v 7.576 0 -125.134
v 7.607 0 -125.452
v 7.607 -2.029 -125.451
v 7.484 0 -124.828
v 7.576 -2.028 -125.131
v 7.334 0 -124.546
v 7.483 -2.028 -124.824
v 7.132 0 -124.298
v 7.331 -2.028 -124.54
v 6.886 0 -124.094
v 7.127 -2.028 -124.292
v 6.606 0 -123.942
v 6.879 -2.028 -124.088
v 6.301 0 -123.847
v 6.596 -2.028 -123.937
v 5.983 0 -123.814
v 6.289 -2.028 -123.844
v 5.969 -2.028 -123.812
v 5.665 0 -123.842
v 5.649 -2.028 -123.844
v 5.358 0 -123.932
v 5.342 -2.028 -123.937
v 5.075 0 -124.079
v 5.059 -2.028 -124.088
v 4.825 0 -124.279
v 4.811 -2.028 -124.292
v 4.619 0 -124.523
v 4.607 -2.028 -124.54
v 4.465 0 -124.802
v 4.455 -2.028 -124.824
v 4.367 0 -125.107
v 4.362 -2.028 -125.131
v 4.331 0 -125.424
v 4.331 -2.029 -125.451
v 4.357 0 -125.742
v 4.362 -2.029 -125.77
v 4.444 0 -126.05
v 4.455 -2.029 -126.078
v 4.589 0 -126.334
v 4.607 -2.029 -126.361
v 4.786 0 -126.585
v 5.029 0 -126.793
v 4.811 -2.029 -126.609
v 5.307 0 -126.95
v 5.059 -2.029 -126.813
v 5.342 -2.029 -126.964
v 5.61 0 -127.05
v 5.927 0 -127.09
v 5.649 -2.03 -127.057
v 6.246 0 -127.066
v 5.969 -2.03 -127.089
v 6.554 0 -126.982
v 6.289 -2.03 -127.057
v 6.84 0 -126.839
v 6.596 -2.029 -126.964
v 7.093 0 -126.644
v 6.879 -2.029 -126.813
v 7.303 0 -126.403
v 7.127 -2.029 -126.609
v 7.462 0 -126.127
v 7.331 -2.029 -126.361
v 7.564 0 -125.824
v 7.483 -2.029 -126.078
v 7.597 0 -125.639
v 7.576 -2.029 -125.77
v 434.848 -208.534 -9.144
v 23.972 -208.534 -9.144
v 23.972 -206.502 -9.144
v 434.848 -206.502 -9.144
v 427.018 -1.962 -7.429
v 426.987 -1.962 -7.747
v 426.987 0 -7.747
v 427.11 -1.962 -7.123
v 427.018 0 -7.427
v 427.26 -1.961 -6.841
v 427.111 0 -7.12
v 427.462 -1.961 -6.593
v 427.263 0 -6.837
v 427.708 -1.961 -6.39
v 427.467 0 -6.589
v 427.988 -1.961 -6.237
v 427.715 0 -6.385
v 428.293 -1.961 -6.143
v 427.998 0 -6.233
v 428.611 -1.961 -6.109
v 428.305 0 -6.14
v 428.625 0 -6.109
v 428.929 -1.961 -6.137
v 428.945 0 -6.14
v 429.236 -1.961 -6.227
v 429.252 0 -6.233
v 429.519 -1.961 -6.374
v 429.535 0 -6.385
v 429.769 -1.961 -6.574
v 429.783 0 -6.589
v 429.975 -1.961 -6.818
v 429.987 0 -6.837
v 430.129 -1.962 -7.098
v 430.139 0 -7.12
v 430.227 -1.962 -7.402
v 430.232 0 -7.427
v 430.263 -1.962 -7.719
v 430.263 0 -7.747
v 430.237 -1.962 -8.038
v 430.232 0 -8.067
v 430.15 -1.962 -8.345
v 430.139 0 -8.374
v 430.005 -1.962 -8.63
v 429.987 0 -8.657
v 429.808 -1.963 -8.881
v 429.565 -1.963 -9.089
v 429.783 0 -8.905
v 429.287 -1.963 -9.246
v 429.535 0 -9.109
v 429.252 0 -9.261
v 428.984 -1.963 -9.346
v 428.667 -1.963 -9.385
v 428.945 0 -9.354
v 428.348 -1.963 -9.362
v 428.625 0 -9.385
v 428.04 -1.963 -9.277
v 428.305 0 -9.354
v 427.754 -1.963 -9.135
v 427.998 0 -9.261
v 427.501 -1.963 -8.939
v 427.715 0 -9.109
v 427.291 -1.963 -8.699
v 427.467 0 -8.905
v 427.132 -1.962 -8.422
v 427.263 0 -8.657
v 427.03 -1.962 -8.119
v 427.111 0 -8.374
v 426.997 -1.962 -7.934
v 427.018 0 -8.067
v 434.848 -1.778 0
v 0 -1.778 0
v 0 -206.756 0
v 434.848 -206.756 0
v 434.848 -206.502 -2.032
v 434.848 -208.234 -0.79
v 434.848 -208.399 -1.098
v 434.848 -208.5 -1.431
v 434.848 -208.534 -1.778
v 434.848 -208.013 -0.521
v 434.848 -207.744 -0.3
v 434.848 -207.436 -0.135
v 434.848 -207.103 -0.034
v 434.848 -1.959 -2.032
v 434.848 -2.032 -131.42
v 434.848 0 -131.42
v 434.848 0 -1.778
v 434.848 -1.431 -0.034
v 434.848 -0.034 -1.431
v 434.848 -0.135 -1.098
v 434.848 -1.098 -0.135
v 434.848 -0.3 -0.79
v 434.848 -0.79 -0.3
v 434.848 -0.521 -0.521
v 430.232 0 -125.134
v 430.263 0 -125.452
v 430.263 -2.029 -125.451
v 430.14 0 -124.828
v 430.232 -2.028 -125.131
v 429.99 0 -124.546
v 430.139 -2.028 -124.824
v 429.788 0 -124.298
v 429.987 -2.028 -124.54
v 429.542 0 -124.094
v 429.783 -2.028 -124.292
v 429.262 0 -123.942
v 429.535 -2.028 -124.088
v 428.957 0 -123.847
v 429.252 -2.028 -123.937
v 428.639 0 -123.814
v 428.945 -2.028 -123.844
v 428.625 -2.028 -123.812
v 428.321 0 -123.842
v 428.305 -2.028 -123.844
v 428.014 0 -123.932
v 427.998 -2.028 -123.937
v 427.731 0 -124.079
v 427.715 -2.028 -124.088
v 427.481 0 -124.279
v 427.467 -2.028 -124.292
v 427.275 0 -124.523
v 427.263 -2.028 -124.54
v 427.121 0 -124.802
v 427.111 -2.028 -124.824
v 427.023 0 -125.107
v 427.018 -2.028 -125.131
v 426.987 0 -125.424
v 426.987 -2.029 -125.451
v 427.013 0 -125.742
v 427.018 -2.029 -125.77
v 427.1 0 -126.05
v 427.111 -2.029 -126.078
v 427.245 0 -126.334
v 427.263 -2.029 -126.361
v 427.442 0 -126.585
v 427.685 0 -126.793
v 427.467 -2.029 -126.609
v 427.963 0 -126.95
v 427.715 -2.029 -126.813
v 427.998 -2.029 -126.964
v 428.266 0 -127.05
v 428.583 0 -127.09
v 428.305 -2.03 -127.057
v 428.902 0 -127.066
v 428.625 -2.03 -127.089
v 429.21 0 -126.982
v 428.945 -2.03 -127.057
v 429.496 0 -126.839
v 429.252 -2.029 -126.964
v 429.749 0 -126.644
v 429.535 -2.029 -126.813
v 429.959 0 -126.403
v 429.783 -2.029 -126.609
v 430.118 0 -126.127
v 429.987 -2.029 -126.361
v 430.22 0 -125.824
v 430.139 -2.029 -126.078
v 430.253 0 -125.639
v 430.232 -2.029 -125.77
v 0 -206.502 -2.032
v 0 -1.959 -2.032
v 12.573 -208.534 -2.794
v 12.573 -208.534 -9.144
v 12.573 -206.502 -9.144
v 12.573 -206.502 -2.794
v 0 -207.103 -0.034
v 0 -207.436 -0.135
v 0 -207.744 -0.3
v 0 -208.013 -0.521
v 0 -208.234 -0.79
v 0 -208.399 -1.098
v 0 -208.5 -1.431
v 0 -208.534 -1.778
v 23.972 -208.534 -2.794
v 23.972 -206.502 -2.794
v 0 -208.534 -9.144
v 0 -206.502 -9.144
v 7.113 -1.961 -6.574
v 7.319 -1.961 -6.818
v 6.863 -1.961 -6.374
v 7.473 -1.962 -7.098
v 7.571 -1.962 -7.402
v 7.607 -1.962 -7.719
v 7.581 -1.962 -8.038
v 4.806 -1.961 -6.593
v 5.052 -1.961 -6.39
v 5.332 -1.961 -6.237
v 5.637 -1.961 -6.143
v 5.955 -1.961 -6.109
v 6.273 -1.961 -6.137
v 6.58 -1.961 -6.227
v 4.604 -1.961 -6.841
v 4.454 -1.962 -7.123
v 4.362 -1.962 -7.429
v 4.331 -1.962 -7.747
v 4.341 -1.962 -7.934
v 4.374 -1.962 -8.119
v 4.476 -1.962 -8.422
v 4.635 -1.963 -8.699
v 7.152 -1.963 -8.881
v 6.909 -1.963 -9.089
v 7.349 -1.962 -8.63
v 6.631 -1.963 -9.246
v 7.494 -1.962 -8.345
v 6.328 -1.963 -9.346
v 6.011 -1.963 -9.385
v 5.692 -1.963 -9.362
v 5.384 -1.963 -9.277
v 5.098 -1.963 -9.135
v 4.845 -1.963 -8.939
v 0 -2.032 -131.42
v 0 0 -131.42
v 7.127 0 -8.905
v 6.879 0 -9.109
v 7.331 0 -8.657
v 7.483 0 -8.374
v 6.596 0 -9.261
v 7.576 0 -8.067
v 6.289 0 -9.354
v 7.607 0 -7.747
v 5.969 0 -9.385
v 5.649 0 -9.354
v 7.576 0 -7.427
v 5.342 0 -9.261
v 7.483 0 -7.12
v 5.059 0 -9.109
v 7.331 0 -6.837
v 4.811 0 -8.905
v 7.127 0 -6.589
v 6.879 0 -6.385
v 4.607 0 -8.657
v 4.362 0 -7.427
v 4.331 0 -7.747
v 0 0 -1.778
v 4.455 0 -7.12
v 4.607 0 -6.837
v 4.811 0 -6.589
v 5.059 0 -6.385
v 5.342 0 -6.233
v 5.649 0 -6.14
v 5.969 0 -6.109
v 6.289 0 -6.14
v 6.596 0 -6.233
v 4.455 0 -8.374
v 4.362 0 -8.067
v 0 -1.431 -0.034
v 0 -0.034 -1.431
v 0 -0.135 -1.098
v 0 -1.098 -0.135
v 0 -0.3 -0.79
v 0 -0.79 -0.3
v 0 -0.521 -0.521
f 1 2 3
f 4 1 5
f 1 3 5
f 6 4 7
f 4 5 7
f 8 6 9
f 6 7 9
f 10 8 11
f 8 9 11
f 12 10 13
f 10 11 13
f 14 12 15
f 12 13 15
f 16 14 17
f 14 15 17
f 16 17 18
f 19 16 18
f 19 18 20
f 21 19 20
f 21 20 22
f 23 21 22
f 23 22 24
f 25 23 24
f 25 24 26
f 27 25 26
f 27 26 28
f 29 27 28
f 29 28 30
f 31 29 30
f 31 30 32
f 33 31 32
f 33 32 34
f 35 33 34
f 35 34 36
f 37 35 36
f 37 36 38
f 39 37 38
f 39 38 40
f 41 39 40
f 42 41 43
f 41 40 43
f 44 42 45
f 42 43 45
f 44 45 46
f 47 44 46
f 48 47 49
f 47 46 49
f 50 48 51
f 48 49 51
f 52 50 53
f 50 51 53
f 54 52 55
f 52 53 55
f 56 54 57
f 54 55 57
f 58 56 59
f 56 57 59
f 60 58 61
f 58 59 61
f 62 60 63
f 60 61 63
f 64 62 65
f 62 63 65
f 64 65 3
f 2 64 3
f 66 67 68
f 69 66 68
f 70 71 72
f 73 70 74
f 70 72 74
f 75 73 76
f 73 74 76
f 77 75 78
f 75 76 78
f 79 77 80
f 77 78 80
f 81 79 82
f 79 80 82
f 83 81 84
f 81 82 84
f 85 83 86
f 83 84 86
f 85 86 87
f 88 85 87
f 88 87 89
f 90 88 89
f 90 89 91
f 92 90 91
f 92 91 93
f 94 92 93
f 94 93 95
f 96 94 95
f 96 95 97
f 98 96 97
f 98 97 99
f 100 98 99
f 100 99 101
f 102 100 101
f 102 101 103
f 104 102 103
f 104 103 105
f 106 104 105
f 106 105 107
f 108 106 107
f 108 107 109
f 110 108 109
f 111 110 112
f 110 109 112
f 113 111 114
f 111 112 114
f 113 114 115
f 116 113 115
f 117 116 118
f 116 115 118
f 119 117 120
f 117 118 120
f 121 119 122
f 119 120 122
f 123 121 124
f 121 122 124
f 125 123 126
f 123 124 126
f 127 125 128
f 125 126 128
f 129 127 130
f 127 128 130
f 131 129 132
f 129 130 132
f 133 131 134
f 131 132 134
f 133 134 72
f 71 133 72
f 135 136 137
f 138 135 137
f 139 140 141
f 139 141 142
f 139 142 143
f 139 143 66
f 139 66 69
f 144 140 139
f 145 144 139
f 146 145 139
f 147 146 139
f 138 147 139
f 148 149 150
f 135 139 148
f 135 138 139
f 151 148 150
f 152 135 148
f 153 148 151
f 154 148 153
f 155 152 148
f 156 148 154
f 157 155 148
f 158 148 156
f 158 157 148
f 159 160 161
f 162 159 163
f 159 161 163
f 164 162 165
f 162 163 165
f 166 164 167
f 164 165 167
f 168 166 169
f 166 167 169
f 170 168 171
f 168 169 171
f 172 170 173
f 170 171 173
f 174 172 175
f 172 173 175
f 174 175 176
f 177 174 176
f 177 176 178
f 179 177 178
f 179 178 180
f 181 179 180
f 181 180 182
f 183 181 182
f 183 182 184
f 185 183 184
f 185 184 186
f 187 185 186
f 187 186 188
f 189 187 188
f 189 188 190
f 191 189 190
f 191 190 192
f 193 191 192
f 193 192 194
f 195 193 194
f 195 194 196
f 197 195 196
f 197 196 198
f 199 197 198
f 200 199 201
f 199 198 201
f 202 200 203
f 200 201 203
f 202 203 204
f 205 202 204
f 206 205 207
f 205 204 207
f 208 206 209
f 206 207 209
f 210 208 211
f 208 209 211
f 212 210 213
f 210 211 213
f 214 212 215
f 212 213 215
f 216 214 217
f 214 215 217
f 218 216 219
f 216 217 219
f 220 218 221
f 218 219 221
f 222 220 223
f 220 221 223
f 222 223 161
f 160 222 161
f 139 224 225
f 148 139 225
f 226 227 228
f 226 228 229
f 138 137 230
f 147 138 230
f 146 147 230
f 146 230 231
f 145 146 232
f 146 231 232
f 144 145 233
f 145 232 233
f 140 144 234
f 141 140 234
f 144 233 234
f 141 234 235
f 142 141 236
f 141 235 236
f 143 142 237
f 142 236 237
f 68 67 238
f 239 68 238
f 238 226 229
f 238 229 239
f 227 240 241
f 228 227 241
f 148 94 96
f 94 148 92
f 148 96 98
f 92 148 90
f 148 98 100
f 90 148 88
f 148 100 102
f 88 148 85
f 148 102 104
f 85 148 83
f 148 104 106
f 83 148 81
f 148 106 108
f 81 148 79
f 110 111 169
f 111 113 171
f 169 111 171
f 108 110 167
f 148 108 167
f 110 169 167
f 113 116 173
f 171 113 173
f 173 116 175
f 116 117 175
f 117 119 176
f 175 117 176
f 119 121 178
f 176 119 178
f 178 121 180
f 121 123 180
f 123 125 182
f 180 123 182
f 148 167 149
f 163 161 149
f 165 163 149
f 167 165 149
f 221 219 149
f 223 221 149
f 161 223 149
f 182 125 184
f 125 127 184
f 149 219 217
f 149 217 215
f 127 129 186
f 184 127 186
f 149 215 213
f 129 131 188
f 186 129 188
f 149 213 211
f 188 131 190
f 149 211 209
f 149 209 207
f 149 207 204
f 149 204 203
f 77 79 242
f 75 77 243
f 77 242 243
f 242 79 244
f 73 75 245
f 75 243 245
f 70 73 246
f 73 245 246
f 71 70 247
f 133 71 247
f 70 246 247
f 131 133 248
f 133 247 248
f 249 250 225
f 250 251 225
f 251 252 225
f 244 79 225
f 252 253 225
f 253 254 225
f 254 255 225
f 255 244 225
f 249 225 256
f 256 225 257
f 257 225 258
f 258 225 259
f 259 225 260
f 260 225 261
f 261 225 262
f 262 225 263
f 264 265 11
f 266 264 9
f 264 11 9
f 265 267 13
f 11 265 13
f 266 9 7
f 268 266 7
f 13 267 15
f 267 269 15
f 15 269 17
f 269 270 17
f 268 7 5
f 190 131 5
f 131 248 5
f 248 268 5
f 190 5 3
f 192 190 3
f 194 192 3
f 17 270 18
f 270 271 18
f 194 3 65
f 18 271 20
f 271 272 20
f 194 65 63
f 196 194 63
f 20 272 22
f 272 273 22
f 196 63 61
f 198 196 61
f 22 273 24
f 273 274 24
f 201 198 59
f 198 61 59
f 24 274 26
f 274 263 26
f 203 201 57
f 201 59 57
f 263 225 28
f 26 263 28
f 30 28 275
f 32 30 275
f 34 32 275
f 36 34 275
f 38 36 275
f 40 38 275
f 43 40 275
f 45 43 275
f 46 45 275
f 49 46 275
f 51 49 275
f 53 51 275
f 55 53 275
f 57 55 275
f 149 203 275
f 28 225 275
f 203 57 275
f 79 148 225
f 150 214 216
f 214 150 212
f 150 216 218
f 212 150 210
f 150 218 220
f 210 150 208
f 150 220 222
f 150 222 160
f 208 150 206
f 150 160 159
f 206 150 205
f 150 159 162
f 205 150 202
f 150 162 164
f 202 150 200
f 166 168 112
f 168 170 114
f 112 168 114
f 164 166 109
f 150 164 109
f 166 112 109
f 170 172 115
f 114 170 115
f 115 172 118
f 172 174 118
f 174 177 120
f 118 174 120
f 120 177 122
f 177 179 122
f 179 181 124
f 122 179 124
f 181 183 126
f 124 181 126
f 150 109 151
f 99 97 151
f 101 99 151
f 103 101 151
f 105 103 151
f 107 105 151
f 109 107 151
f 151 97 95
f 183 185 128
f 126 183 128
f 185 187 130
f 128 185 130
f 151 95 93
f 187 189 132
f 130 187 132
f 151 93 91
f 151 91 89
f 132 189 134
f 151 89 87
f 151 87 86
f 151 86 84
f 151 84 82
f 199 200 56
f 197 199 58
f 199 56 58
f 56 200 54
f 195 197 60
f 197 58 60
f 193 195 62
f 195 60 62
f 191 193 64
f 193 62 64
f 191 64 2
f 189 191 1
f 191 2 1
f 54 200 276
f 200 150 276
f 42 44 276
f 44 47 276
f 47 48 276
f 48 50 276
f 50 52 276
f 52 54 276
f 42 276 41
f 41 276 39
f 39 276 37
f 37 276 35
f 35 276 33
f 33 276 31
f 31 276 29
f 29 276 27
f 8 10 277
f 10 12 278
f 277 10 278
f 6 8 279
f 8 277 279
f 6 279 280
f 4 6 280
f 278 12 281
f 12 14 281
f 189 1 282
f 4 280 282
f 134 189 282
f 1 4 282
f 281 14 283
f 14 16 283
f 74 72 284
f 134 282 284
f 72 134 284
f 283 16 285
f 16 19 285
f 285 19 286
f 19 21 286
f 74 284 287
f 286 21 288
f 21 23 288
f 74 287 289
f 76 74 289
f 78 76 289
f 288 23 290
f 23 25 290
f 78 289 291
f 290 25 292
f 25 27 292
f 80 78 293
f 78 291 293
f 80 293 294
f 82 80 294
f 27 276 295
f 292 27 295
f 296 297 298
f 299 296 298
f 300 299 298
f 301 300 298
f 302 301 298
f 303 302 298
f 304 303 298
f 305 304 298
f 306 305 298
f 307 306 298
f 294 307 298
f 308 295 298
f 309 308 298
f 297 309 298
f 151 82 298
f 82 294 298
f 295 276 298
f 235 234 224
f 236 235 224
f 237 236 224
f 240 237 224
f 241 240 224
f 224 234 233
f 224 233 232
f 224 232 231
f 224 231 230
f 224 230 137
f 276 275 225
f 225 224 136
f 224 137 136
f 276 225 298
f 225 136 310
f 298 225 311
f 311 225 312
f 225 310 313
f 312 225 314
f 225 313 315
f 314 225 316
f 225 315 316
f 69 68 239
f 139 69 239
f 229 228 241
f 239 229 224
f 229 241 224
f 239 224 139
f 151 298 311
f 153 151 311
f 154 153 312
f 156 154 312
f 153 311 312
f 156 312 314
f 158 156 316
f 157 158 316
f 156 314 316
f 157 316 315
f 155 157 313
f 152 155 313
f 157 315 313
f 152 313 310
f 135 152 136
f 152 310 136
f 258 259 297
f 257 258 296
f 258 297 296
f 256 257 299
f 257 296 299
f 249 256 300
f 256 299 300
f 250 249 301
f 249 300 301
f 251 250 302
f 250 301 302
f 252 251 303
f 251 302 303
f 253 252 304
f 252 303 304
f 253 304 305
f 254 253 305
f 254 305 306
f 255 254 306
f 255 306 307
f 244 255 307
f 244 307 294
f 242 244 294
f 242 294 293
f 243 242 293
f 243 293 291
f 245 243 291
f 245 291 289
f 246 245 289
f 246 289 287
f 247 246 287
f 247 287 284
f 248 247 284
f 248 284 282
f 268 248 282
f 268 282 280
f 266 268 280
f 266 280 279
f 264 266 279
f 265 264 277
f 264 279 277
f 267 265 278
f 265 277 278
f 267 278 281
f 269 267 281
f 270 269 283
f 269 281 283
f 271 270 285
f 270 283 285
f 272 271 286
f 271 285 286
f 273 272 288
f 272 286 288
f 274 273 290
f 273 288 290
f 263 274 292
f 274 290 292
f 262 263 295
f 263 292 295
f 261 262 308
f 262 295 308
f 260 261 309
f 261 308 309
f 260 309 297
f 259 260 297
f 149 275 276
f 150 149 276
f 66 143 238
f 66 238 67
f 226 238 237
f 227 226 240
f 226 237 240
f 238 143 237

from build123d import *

# Parameters (mm, degrees)
F1_DEPTH = 434.848
F2_W     = 11.3987904478
F2_H     = 6.35
F3_DEPTH = 25.4
F4_R     = 1.6383
F5_DEPTH = 25.4
F6_R     = 1.6383
F7_DEPTH = 25.4


with BuildPart() as f1:
    # F0 (on Right) → F1 (new body)
    with BuildSketch(Plane.YZ):
        with BuildLine():
            ThreePointArc((0, -1.778), (-0.5207641431, -0.5207641431), (-1.778, 0))
            Line((-1.778, 0), (-206.756, 0))
            ThreePointArc((-206.756, 0), (-208.0132358569, -0.5207641431), (-208.534, -1.778))
            Line((-208.534, -1.778), (-208.534, -9.144))
            Line((-208.534, -9.144), (-206.502, -9.144))
            Line((-206.502, -9.144), (-206.502, -2.032))
            Line((-206.502, -2.032), (-1.9587501884, -2.032))
            Line((-1.9587501884, -2.032), (-2.032, -131.4196))
            Line((-2.032, -131.4196), (0, -131.4196))
            Line((0, -131.4196), (0, -1.778))
        make_face()
    extrude(amount=F1_DEPTH)

    # F2 (on face) → F3 (cut)
    with BuildSketch(Plane.XZ.offset(208.534)):
        with Locations((18.2723952239, -5.969)):
            Rectangle(F2_W, F2_H)
    extrude(amount=-F3_DEPTH, mode=Mode.SUBTRACT)

    # F4 (on face) → F5 (cut)
    with BuildSketch(Plane(origin=(0, -1.9575991909, 0.0011082497), x_dir=(1, 0, 0), z_dir=(0, -0.9999998398, 0.0005661269))):
        with Locations((5.969, -125.4517293099)):
            Circle(F4_R)
        with Locations((428.625, -125.4517293099)):
            Circle(F4_R)
    extrude(amount=-F5_DEPTH, mode=Mode.SUBTRACT)

    # F6 (on face) → F7 (cut)
    with BuildSketch(Plane(origin=(0, 0, 0), x_dir=(-1, 0, 0), z_dir=(0, 1, 0))):
        with Locations((-428.625, -7.747)):
            Circle(F6_R)
        with Locations((-5.969, -7.747)):
            Circle(F6_R)
    extrude(amount=-F7_DEPTH, mode=Mode.SUBTRACT)


solid = f1.part
